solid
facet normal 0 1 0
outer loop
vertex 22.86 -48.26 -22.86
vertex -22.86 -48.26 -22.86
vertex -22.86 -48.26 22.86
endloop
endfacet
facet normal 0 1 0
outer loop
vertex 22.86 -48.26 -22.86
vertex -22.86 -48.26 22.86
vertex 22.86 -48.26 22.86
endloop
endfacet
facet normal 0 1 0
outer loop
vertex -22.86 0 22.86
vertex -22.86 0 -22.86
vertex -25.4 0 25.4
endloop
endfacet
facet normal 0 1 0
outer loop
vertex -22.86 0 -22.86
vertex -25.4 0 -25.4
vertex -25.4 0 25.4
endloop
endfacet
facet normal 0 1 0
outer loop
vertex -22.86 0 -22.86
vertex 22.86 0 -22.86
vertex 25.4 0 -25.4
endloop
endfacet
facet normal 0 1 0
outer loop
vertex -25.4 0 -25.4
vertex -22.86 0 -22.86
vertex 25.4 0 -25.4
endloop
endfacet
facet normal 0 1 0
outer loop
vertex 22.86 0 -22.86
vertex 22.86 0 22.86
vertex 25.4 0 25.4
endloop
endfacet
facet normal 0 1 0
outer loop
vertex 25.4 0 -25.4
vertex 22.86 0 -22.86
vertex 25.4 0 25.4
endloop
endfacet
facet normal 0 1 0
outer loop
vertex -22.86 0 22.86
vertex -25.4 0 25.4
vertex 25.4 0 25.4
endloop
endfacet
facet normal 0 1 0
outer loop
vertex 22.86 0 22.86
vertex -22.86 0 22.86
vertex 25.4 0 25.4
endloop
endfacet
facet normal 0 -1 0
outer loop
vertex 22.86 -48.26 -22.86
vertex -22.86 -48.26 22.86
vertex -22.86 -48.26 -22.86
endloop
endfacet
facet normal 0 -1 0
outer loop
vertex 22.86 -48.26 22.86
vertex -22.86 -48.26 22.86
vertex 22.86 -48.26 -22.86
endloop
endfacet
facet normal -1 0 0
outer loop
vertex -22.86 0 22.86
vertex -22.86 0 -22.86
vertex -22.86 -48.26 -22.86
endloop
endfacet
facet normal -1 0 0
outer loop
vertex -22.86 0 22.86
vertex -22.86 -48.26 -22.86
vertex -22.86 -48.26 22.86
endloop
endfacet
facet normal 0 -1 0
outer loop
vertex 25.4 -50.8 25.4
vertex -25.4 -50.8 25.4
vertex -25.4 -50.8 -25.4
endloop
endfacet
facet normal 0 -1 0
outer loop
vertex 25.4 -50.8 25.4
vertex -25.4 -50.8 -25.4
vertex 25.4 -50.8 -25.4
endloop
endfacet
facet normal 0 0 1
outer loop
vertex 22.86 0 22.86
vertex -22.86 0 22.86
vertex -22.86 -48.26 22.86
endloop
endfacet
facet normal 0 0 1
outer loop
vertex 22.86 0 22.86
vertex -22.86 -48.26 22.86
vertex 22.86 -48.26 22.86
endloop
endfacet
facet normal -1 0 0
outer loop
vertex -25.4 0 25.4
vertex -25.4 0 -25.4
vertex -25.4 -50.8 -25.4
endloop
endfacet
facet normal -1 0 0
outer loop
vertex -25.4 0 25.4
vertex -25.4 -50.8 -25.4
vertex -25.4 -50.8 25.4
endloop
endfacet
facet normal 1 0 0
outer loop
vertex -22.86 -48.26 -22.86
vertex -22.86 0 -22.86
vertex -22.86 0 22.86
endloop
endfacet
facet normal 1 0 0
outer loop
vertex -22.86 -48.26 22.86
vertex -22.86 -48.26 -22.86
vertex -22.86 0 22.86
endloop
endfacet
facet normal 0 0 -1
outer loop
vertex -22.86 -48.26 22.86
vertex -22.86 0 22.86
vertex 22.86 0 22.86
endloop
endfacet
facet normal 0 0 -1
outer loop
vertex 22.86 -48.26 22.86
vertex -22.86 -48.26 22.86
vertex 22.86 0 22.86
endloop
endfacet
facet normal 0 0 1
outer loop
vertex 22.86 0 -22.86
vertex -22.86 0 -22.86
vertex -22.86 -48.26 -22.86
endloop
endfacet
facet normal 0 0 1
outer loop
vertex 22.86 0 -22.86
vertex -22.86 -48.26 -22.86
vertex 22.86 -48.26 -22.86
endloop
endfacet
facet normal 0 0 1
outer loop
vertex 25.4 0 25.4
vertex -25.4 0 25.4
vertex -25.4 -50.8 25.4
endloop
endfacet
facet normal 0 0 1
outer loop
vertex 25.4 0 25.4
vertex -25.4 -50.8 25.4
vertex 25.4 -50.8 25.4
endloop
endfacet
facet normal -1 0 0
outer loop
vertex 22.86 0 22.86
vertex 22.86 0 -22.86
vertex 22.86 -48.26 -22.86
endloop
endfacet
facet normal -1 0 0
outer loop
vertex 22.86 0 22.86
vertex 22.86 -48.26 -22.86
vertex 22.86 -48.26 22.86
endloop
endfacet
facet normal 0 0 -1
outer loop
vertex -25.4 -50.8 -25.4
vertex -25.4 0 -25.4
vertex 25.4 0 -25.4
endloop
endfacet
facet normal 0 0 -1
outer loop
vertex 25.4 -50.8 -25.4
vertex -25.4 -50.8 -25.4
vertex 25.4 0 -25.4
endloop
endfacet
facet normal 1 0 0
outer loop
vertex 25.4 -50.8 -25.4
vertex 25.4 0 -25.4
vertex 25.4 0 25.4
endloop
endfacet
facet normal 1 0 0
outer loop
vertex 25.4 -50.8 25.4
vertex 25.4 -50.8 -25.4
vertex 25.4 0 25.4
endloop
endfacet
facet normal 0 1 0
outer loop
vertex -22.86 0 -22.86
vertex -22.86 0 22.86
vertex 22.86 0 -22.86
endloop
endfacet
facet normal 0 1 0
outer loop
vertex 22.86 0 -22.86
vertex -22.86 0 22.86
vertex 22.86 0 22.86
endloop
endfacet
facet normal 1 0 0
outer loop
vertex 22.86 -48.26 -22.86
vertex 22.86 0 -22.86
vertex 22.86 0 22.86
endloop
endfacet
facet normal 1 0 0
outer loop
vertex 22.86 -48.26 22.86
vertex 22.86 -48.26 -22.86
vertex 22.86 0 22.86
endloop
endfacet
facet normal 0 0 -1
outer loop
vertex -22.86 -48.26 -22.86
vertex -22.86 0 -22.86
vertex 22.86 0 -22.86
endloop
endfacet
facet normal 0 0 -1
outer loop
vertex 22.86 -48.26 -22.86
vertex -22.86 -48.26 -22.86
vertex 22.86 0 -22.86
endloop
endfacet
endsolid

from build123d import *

# Parameters (mm, degrees)
F0_W     = 50.8
F0_H     = 50.8
F1_DEPTH = 50.8
F2_T     = -2.54
F3_W     = 45.72
F3_H     = 45.72
F4_DEPTH = 48.26


with BuildPart() as f1:
    # F0 (on Front) → F1 (new body)
    with BuildSketch(Plane.XZ):
        Rectangle(F0_W, F0_H)
    extrude(amount=F1_DEPTH)

    # F2
    f2_openings = [f1.faces().sort_by_distance(p)[0] for p in [
        (0, 0, 0),
    ]]
    offset(amount=F2_T, openings=f2_openings)


with BuildPart() as f4:
    # F3 (on Front) → F4 (new body, through all)
    with BuildSketch(Plane.XZ):
        Rectangle(F3_W, F3_H)
    extrude(amount=F4_DEPTH)


solid = Compound([f1.part, f4.part])
